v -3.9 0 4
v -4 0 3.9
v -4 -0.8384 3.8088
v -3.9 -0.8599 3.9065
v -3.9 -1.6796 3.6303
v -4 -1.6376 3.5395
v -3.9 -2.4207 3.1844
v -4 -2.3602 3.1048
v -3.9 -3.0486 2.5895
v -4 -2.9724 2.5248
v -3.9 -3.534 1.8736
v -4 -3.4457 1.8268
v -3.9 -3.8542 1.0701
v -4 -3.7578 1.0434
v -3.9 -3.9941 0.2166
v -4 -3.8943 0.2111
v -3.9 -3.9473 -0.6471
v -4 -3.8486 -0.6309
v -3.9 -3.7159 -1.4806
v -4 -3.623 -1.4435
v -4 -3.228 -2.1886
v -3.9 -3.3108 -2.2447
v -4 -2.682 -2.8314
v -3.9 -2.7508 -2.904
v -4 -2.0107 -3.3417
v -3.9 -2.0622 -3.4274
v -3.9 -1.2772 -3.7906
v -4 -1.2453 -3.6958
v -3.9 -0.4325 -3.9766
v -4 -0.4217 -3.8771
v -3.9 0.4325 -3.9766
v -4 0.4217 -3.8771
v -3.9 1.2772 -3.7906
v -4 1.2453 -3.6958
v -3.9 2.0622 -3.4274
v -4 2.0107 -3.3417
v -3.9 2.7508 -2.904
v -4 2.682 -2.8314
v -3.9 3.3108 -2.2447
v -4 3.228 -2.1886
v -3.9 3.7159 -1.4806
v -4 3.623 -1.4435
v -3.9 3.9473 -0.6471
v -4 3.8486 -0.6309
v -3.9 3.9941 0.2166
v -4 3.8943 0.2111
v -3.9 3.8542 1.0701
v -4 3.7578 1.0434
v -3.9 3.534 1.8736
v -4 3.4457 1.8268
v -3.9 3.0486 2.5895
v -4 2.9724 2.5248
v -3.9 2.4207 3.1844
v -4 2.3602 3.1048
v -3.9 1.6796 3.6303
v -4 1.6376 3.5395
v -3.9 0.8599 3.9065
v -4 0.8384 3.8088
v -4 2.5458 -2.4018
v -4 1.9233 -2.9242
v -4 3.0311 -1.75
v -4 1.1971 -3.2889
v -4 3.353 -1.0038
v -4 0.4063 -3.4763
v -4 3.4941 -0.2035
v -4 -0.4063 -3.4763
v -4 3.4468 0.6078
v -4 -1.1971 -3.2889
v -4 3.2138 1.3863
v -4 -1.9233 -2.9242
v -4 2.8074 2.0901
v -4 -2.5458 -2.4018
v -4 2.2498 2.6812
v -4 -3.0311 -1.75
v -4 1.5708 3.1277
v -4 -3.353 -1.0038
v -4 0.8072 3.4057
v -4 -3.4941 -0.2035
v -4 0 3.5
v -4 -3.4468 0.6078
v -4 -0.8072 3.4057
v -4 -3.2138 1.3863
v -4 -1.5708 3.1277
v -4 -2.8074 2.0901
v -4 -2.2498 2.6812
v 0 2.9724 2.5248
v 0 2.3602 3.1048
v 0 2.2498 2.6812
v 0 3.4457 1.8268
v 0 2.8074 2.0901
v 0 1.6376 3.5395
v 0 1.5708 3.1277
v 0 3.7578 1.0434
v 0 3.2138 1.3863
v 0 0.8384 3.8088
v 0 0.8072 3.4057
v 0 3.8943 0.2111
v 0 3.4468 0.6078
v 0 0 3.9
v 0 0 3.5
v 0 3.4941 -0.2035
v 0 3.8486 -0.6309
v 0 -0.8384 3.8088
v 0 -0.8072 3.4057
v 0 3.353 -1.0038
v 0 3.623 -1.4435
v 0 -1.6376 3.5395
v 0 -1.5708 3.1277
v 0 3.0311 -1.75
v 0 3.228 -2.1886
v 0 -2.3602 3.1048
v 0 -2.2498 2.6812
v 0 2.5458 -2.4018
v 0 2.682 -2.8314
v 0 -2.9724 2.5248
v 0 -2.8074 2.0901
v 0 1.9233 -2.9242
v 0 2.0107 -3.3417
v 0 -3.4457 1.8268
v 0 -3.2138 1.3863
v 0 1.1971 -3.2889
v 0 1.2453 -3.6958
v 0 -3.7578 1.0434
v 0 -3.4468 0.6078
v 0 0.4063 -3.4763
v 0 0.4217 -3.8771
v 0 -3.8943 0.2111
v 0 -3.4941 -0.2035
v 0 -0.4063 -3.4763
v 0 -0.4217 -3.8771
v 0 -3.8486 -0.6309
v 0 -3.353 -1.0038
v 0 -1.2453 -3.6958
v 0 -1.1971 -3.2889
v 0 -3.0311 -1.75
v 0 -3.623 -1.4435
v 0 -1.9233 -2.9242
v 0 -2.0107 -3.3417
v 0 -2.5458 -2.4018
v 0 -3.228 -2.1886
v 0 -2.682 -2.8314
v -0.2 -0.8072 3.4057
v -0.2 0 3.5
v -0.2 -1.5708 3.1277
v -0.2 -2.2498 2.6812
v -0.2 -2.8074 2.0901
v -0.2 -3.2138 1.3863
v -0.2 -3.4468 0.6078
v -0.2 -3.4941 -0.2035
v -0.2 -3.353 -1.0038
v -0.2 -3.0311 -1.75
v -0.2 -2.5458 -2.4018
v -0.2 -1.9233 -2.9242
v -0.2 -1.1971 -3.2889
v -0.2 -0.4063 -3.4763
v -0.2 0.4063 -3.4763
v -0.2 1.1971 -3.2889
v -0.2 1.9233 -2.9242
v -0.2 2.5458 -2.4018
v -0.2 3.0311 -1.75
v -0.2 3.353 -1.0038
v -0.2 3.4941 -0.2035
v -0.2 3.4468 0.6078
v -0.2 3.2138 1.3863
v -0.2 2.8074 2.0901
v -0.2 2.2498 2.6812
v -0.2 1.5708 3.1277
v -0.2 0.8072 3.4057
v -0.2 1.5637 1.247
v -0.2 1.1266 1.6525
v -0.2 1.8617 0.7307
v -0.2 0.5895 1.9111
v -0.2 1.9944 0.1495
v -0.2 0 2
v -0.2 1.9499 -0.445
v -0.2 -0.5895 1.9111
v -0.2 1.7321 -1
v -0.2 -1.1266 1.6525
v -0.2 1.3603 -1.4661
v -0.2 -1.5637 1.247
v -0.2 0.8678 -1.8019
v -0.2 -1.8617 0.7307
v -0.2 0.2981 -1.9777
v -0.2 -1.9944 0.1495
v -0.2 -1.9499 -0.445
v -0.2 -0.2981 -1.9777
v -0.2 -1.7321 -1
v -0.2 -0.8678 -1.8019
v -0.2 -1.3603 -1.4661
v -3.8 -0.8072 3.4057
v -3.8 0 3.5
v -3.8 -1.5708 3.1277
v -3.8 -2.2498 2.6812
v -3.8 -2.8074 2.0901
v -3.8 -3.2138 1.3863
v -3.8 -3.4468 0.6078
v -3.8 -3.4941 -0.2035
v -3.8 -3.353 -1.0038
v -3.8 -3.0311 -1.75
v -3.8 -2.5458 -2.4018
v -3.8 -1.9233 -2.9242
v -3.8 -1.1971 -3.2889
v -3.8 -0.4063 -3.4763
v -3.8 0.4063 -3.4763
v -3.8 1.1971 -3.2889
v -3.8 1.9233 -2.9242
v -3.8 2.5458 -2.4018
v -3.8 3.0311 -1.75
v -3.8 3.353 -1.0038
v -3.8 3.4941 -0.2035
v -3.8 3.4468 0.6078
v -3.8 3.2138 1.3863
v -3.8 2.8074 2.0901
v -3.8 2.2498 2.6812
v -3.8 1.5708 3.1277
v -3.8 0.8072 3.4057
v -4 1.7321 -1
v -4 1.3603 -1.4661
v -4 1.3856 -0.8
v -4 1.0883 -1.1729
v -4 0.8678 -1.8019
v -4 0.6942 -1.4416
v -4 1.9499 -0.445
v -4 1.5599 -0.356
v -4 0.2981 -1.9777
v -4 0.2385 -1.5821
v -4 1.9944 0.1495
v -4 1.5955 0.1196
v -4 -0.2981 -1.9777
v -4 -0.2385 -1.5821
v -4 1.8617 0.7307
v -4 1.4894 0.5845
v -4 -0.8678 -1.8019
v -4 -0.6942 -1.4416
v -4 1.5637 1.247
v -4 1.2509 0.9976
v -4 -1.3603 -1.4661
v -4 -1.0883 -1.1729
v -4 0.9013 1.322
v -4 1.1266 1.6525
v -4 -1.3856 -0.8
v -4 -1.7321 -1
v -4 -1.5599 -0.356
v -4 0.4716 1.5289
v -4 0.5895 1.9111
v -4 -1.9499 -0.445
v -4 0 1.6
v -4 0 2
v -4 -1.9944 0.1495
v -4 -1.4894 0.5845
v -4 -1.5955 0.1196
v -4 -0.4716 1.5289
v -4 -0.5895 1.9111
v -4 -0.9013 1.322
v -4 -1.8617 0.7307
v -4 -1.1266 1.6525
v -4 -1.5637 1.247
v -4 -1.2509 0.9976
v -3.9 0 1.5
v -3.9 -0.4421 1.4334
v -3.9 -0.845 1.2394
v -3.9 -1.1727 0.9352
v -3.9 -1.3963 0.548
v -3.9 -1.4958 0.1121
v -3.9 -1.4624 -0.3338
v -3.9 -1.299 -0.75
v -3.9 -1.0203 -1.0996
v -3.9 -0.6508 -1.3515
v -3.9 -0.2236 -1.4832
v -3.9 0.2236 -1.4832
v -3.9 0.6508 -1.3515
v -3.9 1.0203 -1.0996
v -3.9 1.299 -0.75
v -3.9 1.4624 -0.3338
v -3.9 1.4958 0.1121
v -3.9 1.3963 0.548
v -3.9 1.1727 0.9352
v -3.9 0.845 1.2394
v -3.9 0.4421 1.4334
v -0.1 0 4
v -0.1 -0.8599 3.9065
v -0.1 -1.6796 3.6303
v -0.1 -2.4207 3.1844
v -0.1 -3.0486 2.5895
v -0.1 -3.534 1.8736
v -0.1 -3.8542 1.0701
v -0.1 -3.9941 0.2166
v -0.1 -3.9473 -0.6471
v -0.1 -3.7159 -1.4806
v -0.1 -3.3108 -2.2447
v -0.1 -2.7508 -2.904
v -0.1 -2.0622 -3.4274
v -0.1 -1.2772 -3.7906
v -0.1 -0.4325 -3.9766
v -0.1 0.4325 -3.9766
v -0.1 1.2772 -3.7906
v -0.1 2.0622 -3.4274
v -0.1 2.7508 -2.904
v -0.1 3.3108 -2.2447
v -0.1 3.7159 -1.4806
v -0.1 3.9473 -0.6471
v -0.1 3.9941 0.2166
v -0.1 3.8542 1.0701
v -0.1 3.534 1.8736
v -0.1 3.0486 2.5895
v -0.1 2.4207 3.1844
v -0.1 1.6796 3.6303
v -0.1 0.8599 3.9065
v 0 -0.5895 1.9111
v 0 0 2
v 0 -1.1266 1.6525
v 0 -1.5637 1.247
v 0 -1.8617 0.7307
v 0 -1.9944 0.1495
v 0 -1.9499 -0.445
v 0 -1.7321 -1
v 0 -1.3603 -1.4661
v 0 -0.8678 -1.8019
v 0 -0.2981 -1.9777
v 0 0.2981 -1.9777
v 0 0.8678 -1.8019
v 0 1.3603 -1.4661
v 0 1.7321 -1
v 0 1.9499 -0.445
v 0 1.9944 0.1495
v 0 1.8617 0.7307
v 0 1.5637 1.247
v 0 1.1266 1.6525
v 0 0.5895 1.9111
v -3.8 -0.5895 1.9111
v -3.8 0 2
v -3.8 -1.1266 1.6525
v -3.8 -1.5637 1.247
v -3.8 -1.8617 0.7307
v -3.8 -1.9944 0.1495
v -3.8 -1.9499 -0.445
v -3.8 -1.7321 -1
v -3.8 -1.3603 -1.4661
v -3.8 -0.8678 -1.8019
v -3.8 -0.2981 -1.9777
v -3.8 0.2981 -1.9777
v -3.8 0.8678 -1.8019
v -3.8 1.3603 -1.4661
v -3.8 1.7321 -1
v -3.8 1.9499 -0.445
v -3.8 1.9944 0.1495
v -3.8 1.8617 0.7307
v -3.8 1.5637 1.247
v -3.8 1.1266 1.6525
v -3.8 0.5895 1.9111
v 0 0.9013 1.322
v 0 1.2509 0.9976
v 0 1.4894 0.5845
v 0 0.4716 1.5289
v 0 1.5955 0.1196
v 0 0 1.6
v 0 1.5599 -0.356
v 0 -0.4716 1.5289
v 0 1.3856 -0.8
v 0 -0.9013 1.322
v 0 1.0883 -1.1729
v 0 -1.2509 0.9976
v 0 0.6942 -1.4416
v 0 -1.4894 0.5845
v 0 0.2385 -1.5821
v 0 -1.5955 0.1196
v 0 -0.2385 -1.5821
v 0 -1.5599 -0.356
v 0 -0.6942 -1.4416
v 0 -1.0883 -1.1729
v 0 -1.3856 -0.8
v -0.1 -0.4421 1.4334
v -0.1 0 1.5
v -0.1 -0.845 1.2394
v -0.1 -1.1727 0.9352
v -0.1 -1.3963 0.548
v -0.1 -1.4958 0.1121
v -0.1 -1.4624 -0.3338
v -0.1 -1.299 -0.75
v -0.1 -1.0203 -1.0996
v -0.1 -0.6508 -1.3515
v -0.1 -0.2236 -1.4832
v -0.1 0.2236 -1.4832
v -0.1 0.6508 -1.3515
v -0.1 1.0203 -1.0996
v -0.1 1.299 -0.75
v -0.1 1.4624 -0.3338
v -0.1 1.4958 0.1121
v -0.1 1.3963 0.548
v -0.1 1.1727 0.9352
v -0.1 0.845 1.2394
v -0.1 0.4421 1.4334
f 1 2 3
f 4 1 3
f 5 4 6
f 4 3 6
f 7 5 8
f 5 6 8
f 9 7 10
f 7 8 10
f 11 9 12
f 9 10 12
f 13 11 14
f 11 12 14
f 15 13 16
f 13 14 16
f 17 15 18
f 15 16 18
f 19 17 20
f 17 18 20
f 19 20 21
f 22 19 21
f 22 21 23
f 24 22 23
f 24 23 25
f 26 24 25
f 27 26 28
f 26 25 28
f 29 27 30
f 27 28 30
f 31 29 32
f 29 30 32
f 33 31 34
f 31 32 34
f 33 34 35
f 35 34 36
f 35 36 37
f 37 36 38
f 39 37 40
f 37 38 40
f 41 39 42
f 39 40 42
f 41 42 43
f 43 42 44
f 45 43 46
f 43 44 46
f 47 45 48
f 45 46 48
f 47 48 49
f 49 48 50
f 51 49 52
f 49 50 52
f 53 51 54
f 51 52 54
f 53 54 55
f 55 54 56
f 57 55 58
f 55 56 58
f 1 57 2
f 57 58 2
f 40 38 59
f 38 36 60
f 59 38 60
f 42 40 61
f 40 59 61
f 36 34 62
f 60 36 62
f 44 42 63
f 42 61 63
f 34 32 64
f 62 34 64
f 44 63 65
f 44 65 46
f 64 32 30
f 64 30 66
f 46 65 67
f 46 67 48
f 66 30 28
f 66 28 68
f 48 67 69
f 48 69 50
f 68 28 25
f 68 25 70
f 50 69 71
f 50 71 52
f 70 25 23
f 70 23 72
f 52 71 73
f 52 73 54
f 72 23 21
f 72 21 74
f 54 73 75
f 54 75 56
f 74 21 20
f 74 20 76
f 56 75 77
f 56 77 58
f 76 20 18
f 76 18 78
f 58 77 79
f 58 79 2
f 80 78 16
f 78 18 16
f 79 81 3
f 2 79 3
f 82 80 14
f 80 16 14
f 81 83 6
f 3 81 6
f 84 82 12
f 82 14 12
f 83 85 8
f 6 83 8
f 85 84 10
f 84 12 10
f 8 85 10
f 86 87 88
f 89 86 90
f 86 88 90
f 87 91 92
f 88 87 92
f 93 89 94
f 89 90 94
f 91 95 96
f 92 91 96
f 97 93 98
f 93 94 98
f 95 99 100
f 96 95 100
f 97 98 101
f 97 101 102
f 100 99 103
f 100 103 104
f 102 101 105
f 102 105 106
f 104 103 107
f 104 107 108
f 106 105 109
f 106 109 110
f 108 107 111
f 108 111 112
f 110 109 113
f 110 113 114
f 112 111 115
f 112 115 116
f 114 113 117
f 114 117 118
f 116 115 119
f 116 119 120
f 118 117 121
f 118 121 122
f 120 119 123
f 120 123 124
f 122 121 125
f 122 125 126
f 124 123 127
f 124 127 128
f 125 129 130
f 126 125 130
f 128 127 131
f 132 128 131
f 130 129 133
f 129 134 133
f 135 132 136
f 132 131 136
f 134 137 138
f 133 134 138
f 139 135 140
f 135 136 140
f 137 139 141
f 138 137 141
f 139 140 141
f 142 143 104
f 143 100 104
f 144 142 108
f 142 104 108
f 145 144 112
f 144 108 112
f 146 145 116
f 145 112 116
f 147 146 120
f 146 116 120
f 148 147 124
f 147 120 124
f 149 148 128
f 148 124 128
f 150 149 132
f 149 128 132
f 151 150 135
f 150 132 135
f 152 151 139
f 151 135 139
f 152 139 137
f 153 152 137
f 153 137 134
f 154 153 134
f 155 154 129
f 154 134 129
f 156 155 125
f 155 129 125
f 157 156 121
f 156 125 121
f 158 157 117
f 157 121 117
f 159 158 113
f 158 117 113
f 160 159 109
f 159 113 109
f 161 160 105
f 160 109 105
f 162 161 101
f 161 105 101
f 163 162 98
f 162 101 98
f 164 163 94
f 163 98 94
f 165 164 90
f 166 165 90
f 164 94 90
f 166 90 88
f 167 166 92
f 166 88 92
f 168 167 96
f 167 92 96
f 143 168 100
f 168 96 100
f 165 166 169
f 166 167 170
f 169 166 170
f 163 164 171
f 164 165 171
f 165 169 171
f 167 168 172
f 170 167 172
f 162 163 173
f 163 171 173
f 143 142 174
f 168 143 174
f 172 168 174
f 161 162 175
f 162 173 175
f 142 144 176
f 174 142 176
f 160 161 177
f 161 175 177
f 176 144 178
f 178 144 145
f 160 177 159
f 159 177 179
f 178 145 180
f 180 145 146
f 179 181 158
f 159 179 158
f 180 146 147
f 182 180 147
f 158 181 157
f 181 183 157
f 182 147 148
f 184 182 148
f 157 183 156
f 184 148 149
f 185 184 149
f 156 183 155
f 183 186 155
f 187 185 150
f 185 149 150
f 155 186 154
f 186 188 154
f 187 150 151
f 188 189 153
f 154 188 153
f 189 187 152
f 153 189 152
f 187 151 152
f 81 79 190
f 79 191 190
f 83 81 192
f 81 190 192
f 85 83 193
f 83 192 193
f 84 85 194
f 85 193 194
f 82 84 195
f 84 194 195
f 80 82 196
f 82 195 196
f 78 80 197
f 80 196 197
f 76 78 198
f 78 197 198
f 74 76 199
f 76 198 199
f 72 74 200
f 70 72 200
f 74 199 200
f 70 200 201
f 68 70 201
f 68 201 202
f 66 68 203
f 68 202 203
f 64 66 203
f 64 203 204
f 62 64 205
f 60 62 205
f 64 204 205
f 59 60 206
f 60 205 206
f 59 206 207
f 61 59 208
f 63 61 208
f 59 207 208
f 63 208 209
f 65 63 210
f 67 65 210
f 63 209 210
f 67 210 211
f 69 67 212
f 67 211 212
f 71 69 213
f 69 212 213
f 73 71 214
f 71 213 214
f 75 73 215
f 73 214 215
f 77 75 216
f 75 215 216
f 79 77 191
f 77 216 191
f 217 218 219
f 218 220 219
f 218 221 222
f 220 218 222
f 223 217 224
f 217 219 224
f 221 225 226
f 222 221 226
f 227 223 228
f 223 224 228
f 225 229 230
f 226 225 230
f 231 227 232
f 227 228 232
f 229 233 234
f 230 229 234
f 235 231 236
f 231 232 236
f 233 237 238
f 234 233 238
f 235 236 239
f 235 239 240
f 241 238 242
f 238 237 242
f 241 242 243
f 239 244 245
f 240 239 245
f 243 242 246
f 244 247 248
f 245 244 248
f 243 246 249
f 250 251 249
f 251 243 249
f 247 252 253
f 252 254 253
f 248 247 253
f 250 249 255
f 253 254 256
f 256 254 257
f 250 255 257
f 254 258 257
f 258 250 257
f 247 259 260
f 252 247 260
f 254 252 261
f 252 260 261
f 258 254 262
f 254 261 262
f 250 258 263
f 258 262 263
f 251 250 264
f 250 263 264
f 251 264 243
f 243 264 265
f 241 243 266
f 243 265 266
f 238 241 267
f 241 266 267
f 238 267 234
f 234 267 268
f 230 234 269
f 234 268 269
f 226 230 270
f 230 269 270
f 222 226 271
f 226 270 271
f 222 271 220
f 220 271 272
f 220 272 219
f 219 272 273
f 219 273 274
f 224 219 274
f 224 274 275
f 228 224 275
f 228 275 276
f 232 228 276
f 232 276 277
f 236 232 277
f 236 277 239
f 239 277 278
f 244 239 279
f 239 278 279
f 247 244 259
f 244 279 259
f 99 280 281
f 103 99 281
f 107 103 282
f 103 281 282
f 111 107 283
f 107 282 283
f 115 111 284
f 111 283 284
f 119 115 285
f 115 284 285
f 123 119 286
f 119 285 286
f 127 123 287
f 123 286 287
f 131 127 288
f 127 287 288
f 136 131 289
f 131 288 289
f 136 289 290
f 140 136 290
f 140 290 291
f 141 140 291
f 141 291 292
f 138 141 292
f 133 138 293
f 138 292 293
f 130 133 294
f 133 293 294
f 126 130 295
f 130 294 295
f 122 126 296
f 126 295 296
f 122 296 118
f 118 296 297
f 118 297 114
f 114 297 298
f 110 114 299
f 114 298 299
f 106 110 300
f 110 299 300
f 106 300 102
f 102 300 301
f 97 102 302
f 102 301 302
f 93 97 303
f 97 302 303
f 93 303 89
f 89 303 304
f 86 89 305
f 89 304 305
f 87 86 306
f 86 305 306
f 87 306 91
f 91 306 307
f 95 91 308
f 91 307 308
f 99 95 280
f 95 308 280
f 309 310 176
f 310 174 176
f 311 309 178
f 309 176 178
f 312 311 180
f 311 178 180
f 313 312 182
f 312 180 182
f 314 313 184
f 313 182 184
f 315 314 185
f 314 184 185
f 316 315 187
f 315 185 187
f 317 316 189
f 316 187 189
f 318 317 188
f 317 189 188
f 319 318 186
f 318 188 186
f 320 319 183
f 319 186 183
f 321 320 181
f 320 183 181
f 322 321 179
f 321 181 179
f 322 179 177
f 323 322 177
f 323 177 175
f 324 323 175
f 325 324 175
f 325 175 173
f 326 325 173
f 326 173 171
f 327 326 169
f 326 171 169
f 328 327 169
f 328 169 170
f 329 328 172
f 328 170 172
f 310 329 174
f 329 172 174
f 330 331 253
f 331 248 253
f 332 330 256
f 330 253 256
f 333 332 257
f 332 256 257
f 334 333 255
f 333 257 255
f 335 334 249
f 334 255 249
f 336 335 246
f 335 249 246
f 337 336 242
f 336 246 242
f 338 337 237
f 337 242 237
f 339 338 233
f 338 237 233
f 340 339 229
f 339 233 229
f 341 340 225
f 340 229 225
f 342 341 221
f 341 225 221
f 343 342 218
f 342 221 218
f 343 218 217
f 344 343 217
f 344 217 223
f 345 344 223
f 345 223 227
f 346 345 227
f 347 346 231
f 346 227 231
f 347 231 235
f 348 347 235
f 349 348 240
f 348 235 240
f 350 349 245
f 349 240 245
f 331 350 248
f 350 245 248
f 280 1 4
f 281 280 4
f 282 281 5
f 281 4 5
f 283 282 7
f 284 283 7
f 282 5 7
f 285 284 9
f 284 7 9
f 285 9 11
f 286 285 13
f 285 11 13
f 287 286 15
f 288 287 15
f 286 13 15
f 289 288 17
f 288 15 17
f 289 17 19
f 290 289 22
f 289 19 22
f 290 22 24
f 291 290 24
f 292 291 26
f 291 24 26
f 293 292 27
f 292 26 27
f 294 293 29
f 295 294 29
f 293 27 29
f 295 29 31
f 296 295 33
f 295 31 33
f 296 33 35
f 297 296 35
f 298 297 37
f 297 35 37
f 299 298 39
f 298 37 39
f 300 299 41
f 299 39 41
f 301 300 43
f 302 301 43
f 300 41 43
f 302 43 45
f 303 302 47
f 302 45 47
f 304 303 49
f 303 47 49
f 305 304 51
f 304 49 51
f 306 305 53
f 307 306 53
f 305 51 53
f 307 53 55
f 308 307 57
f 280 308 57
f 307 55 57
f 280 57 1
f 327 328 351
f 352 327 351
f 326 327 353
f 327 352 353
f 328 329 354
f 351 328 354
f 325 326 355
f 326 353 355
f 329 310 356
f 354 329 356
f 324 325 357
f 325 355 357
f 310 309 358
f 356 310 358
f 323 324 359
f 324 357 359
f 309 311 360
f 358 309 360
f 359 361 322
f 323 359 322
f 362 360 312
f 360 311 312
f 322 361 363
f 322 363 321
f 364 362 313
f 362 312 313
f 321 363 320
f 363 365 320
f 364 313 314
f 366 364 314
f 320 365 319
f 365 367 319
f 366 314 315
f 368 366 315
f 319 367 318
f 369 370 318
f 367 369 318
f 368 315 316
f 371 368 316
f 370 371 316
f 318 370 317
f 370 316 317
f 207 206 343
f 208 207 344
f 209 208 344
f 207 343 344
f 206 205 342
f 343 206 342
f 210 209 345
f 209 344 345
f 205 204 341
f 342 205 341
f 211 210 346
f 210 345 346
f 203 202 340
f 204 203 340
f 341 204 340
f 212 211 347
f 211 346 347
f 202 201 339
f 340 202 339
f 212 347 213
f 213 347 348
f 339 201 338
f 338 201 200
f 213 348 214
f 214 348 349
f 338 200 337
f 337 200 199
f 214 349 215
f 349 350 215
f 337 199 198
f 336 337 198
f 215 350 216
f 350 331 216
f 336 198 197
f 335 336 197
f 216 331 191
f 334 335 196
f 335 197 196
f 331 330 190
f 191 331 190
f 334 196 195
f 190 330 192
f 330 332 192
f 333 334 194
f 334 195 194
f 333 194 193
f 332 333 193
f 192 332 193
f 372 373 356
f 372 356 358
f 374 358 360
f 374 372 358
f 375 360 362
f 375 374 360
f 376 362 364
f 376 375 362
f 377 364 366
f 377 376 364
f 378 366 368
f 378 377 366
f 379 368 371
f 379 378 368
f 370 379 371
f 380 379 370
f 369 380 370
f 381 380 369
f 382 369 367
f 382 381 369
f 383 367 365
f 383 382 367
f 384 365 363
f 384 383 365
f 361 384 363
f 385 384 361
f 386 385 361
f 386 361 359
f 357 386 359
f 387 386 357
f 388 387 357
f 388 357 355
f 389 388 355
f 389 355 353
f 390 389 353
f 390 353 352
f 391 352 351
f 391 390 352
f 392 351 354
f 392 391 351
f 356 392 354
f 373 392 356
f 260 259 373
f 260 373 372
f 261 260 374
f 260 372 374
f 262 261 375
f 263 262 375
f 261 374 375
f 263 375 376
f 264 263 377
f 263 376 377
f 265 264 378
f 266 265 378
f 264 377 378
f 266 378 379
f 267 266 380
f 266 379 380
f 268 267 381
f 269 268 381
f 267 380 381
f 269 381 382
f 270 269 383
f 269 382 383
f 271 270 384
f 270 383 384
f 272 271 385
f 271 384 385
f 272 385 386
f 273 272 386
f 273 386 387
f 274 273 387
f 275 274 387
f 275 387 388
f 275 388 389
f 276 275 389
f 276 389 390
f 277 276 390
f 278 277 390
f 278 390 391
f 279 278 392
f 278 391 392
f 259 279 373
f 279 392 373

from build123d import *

# Parameters (mm, degrees)
CHAMFER_1_SIZE = 0.1


with BuildPart() as part:
    # 草图1 → 旋转1 (revolve)
    with BuildSketch(Plane.XY, mode=Mode.PRIVATE) as revolve_1_sk:
        Polygon((0, 1.5), (0, 2), (-0.2, 2), (-0.2, 3.5), (0, 3.5), (0, 4), (-4, 4), (-4, 3.5), (-3.8, 3.5), (-3.8, 2), (-4, 2), (-4, 1.5), align=None)
    revolve(revolve_1_sk.sketch.rotate(Axis((-16.444867367, 0, 0), (1, 0, 0)), 90), axis=Axis((-16.444867367, 0, 0), (1, 0, 0)))

    # 倒角1
    chamfer_1_edges = [part.edges().sort_by_distance(p)[0] for p in [
        (-4, 0, -4),
        (0, 0, -4),
        (0, 0, -1.5),
        (-4, 0, -1.5),
    ]]
    chamfer(chamfer_1_edges, length=CHAMFER_1_SIZE)


solid = part.part
